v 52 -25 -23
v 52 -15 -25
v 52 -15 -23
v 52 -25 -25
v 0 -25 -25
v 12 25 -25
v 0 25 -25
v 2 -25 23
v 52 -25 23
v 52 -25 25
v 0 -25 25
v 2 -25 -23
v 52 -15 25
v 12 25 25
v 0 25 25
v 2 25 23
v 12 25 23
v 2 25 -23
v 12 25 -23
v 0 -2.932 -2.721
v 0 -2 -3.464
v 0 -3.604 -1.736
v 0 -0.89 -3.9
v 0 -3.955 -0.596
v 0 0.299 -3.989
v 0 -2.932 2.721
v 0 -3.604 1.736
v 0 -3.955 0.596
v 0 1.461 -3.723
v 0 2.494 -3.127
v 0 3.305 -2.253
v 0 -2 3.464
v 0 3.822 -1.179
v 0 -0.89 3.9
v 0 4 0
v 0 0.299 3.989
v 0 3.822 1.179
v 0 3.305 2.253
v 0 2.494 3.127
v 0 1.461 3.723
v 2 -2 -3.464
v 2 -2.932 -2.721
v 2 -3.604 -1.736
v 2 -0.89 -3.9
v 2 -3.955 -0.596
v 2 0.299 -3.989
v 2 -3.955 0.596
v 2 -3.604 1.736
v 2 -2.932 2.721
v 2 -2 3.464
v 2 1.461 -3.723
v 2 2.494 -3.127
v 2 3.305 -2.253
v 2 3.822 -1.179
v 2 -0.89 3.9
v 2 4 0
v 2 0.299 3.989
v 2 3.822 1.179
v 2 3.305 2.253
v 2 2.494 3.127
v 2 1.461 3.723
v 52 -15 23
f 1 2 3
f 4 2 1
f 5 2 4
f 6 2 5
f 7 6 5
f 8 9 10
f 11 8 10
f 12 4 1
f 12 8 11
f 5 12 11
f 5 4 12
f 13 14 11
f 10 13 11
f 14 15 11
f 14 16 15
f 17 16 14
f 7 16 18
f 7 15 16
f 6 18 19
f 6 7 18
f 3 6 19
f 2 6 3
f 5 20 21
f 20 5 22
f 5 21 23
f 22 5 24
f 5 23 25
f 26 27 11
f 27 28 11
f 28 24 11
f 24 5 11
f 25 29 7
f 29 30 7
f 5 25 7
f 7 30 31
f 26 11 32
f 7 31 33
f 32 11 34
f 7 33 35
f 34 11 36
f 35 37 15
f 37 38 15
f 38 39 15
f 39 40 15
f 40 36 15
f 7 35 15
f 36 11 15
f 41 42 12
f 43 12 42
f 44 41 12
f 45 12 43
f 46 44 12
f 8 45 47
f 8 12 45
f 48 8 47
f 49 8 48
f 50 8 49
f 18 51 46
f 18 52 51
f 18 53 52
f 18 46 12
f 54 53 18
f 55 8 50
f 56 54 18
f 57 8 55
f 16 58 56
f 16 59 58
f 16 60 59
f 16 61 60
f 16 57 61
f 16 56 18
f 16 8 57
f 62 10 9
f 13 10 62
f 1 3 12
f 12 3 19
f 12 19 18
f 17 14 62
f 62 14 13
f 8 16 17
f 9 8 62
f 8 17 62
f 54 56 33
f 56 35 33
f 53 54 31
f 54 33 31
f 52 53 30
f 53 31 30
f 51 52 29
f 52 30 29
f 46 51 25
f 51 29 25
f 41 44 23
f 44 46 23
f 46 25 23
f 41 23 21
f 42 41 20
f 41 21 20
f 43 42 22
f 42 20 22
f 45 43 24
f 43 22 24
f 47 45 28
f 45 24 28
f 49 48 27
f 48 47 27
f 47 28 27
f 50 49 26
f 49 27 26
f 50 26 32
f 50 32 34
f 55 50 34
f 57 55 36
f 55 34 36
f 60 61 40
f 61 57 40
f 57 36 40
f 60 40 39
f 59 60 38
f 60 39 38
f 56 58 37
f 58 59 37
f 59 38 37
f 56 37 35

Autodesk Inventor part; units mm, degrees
ref_plane "YZ Plane" through (0, 0, 0) normal (1, 0, 0) x (0, 1, 0)
ref_plane "XZ Plane" through (0, 0, 0) normal (0, 1, 0) x (-1, 0, 0)
ref_plane "XY Plane" through (0, 0, 0) normal (0, 0, 1) x (1, 0, 0)
sketch "Sketch1" plane through (0, 0, 0) normal (1, 0, 0) x (0, 1, 0)
  line L0 (25, 25) -> (-25, 25)
  line L1 (-25, 25) -> (-25, -25)
  line L2 (-25, -25) -> (25, -25)
  line L3 (25, -25) -> (25, 25)
  line L4 (25, 25) -> (-25, -25) construction
  line L5 (-25, 25) -> (25, -25) construction
  circle A0 centre (0, 0) radius 4
  dimension "d0" = 50
  dimension "d1" = 50
  dimension "d11" = 8
extrude "Extrusion1" add sketch "Sketch1" along normal blind 2
sketch "Sketch2" plane through (0, -25, 25) normal (0, 0, 1) x (1, 0, 0)
  line L0 (2, 0) -> (52, 0)
  line L1 (52, 0) -> (52, 10)
  line L2 (2, 0) -> (2, 50) projected
  line L3 (2, 50) -> (12, 50)
  line L4 (12, 50) -> (52, 10)
  point P0 (0, 25)
  dimension "d4" = 50
  dimension "d5" = 10
  dimension "d6" = 10
extrude "Extrusion2" add sketch "Sketch2" against normal blind 2
sketch "Sketch3" plane through (0, -25, -25) normal (0, 0, -1) x (-1, 0, 0)
  line L0 (-52, 0) -> (-2, 0) projected
  line L1 (-2, 50) -> (-2, 0) projected
  line L2 (-2, 50) -> (-12, 50) projected
  line L3 (-12, 50) -> (-52, 10) projected
  line L4 (-52, 10) -> (-52, 0) projected
  point P0 (0, 25)
extrude "Extrusion3" add sketch "Sketch3" against normal blind 2
properties part number "Tensioner_fix"
